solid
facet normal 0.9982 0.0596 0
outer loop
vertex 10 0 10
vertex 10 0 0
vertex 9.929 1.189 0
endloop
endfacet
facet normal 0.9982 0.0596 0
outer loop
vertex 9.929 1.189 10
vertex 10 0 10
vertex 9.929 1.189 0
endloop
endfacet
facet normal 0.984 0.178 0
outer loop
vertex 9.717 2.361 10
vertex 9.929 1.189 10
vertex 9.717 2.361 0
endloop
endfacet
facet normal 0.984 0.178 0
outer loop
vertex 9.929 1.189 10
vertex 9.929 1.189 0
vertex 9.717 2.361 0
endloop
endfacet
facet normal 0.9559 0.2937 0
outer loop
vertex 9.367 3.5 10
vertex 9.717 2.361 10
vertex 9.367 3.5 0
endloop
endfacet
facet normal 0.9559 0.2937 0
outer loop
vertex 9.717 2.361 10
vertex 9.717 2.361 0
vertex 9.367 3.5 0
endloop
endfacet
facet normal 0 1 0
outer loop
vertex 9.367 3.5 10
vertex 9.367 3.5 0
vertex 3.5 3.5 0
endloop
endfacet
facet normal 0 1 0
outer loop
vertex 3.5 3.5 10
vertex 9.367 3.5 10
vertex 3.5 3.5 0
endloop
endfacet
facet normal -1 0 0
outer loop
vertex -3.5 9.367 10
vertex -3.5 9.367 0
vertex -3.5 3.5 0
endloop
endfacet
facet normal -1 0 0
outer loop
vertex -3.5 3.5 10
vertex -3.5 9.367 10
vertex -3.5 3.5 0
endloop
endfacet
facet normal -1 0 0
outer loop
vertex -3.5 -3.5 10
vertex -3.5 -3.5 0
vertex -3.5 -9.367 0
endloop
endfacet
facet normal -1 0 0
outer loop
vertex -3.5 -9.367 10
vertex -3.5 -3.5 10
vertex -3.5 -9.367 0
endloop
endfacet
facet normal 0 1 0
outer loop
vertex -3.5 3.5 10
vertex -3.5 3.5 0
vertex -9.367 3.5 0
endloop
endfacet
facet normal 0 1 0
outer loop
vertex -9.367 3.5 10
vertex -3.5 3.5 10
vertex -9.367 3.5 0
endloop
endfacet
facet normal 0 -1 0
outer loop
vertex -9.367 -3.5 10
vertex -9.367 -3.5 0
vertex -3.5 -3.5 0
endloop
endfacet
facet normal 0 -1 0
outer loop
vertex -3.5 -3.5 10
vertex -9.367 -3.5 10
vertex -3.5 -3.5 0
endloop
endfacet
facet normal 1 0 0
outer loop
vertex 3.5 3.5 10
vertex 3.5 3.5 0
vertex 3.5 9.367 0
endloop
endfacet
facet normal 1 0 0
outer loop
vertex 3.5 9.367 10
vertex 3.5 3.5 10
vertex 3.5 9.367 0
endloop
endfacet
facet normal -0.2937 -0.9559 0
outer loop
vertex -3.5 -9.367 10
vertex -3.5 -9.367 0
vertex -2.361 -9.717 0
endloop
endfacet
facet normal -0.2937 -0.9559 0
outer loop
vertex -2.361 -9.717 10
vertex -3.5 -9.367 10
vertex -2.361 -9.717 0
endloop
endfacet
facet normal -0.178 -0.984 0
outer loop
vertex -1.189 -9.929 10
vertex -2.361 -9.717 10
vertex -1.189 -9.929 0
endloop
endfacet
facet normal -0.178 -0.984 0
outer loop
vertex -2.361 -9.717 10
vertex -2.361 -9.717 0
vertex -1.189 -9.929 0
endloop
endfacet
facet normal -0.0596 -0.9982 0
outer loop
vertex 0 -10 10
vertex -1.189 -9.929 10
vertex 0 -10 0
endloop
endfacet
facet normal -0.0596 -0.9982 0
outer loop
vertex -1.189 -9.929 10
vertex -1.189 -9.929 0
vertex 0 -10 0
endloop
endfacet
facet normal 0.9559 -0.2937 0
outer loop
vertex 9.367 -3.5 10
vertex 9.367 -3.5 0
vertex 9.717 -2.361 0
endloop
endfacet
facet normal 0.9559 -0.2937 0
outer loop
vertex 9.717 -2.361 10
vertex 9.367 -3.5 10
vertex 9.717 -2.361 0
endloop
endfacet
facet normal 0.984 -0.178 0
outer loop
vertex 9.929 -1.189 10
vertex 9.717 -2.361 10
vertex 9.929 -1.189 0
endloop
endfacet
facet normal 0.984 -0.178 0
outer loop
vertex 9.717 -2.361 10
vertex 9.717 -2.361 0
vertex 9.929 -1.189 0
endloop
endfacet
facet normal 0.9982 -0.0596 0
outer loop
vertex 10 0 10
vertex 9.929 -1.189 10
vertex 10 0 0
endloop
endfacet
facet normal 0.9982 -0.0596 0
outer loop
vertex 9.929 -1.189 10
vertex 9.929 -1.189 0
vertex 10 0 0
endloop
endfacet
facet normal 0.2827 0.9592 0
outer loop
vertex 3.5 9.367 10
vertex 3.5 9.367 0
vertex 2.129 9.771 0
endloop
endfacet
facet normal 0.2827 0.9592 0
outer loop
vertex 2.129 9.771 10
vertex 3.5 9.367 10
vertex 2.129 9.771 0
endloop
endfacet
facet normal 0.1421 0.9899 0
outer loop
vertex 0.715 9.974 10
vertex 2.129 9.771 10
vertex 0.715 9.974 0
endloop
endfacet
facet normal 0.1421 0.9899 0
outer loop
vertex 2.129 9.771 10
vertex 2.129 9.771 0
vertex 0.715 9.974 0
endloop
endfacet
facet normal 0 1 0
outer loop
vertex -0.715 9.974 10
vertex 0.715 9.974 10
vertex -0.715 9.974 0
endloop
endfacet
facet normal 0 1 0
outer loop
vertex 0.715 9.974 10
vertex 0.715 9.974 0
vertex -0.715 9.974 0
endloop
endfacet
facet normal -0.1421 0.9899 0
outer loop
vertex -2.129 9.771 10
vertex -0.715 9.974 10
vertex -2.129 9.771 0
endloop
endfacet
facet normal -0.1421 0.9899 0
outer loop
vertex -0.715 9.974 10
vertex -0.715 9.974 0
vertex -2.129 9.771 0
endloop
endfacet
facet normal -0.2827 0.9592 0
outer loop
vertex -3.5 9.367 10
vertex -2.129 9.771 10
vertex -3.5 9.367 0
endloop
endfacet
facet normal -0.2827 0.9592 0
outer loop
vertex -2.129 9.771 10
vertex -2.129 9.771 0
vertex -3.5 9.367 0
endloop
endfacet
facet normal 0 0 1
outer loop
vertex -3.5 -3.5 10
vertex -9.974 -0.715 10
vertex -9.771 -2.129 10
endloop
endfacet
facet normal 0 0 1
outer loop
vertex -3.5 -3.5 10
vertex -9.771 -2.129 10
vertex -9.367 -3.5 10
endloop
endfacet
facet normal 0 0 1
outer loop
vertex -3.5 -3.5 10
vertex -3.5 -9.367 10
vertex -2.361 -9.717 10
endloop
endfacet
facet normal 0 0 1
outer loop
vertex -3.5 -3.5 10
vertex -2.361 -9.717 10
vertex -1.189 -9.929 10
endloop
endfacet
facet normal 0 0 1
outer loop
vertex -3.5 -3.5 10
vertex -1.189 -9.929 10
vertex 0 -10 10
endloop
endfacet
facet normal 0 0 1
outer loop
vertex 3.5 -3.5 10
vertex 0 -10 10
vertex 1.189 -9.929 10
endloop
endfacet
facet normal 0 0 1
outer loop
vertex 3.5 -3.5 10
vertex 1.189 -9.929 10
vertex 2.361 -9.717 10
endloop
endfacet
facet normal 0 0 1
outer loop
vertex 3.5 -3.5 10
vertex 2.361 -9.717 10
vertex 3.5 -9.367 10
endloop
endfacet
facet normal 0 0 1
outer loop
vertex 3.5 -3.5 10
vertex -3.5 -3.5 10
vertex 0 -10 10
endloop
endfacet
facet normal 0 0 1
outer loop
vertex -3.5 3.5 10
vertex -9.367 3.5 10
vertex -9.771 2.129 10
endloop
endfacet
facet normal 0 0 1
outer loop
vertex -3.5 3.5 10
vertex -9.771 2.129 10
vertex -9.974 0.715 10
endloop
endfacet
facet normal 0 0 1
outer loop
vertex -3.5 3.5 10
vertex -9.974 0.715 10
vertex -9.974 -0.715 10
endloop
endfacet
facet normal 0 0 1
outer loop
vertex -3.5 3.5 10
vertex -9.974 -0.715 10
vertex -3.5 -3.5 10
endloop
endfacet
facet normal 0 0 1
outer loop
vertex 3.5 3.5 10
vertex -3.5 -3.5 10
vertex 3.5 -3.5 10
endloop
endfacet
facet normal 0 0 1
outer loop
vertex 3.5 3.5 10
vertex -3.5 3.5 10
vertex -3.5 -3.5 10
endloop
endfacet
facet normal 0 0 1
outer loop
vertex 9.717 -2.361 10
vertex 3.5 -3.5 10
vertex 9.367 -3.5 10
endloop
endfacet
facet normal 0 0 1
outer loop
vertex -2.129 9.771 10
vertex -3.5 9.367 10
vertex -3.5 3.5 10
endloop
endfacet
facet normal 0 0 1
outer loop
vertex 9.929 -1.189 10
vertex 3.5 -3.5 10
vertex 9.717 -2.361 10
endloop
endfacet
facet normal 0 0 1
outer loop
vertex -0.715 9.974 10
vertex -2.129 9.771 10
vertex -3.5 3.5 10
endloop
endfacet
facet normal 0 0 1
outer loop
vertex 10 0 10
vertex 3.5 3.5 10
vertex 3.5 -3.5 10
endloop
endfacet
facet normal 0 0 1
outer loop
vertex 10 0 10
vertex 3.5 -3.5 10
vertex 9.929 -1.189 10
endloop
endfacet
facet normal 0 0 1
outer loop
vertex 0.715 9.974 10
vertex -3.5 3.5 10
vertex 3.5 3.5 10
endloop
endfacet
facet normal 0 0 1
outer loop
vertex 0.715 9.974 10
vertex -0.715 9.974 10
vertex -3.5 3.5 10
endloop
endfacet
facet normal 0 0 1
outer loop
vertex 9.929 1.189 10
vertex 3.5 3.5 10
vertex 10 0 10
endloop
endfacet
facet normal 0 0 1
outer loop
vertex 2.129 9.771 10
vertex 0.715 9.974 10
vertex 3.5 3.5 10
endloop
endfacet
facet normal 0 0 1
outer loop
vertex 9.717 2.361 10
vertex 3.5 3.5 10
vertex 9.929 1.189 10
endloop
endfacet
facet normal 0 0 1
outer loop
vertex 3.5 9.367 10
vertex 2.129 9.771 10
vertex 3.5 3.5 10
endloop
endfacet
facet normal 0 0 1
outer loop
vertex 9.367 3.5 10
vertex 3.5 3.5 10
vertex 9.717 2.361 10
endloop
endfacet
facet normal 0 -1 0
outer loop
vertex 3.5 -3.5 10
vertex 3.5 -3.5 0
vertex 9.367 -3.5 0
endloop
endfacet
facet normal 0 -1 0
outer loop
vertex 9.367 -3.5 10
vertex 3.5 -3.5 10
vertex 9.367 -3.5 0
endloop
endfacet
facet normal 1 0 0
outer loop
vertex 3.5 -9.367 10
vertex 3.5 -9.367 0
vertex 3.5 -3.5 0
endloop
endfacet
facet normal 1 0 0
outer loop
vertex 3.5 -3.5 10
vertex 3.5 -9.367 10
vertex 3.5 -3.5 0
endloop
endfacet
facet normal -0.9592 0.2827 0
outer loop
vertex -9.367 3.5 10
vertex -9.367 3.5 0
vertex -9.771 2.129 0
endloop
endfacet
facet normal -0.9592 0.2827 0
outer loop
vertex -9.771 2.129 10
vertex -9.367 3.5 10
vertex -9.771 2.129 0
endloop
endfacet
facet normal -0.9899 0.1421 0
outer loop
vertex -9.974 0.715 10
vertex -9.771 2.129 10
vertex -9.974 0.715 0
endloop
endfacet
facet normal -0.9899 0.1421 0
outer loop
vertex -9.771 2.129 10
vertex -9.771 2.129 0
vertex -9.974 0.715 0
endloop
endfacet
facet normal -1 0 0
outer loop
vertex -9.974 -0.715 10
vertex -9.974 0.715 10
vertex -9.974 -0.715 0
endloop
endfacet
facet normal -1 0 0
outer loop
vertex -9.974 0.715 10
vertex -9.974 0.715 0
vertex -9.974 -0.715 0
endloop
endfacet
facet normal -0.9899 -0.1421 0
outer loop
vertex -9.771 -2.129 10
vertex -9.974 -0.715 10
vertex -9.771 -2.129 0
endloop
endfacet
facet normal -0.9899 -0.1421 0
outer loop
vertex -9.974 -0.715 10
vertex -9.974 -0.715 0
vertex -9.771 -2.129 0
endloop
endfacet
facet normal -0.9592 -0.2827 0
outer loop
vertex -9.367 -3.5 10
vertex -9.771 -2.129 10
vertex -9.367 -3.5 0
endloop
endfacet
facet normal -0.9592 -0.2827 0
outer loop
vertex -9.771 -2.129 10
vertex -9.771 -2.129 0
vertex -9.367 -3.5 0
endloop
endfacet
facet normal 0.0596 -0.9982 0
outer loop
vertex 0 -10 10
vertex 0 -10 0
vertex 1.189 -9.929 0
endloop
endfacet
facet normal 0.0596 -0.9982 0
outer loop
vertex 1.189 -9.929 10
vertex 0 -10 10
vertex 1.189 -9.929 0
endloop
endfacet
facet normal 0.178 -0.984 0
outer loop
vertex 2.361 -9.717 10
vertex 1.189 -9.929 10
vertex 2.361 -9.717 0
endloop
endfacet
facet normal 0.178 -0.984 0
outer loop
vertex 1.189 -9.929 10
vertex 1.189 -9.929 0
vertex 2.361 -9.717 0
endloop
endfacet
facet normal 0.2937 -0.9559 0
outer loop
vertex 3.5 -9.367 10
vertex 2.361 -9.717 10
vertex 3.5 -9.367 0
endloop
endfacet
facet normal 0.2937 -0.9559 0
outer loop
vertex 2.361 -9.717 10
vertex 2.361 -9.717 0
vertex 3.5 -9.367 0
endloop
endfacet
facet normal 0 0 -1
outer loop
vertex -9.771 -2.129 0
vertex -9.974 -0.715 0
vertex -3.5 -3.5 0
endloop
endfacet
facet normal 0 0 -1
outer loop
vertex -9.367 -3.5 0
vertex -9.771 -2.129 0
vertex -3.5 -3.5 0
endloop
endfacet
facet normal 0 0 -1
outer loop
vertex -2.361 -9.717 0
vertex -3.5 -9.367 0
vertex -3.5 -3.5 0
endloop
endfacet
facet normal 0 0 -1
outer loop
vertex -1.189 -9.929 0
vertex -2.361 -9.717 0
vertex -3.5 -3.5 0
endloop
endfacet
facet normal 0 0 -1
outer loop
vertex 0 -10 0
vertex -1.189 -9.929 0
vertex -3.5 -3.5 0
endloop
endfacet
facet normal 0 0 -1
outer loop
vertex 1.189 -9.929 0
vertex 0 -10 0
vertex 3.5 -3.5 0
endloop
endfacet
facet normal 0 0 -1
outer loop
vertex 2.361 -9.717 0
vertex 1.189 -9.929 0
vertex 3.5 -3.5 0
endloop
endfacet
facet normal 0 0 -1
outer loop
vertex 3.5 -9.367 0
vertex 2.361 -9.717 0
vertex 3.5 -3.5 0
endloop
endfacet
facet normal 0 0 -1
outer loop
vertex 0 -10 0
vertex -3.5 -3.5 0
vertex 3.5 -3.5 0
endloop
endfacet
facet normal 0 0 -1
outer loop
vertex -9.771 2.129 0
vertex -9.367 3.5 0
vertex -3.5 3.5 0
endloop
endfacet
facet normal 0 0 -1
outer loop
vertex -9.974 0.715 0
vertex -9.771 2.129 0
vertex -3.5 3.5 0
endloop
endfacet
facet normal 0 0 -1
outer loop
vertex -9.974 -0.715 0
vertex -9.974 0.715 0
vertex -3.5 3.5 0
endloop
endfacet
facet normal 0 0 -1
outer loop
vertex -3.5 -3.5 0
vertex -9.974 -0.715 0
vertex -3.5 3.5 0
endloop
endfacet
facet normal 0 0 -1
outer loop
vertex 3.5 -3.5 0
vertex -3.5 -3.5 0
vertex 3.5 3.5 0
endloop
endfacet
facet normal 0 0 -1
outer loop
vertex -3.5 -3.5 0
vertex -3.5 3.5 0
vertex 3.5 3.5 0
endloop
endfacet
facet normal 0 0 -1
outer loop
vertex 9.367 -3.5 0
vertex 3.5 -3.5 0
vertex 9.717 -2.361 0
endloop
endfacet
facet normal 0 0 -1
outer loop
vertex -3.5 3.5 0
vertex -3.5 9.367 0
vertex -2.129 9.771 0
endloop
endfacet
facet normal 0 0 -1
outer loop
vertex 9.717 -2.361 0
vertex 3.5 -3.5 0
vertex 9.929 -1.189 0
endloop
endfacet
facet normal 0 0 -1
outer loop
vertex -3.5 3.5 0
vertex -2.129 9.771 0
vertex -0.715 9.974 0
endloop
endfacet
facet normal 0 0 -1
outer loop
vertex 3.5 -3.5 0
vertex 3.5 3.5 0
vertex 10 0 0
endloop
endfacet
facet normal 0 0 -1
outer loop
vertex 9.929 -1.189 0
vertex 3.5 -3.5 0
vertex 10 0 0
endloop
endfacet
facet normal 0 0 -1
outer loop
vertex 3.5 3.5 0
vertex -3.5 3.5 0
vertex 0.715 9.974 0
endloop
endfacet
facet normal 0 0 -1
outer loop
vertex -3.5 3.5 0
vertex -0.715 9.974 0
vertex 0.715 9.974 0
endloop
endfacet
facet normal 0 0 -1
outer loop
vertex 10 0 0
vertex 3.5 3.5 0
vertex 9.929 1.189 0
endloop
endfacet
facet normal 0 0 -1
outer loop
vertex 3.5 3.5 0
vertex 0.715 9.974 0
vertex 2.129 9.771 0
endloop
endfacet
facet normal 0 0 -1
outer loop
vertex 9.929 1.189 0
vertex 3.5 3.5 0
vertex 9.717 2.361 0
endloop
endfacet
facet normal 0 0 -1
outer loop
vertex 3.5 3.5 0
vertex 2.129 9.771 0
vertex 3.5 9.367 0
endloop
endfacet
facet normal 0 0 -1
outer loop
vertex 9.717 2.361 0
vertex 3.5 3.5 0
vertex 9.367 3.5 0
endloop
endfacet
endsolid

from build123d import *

# Parameters (mm, degrees)
SKETCH_1_W      = 7
SKETCH_1_H      = 7
EXTRUDE_1_DEPTH = 10


with BuildPart() as part:
    # 스케치1 → 보스-돌출1 (new body)
    with BuildSketch(Plane.XY):
        with BuildLine():
            Line((-3.5, 3.5), (3.5, 3.5))
            Line((3.5, 3.5), (3.5, 9.367496998))
            ThreePointArc((3.5, 9.367496998), (0, 10), (-3.5, 9.367496998))
            Line((-3.5, 9.367496998), (-3.5, 3.5))
        make_face()
        with BuildLine():
            Line((-9.367496998, -3.5), (-3.5, -3.5))
            Line((-3.5, -3.5), (-3.5, 3.5))
            Line((-3.5, 3.5), (-9.367496998, 3.5))
            ThreePointArc((-9.367496998, 3.5), (-10, 0), (-9.367496998, -3.5))
        make_face()
        Rectangle(SKETCH_1_W, SKETCH_1_H)
        with BuildLine():
            ThreePointArc((-3.5, -9.367496998), (-1.778346145, -9.840603893), (0, -10))
            ThreePointArc((0, -10), (1.778346145, -9.840603893), (3.5, -9.367496998))
            Line((3.5, -9.367496998), (3.5, -3.5))
            Line((3.5, -3.5), (-3.5, -3.5))
            Line((-3.5, -3.5), (-3.5, -9.367496998))
        make_face()
        with BuildLine():
            Line((3.5, 3.5), (3.5, -3.5))
            Line((3.5, -3.5), (9.367496998, -3.5))
            ThreePointArc((9.367496998, -3.5), (9.840603893, -1.778346145), (10, 0))
            ThreePointArc((10, 0), (9.840603893, 1.778346145), (9.367496998, 3.5))
            Line((9.367496998, 3.5), (3.5, 3.5))
        make_face()
    extrude(amount=EXTRUDE_1_DEPTH)


solid = part.part
